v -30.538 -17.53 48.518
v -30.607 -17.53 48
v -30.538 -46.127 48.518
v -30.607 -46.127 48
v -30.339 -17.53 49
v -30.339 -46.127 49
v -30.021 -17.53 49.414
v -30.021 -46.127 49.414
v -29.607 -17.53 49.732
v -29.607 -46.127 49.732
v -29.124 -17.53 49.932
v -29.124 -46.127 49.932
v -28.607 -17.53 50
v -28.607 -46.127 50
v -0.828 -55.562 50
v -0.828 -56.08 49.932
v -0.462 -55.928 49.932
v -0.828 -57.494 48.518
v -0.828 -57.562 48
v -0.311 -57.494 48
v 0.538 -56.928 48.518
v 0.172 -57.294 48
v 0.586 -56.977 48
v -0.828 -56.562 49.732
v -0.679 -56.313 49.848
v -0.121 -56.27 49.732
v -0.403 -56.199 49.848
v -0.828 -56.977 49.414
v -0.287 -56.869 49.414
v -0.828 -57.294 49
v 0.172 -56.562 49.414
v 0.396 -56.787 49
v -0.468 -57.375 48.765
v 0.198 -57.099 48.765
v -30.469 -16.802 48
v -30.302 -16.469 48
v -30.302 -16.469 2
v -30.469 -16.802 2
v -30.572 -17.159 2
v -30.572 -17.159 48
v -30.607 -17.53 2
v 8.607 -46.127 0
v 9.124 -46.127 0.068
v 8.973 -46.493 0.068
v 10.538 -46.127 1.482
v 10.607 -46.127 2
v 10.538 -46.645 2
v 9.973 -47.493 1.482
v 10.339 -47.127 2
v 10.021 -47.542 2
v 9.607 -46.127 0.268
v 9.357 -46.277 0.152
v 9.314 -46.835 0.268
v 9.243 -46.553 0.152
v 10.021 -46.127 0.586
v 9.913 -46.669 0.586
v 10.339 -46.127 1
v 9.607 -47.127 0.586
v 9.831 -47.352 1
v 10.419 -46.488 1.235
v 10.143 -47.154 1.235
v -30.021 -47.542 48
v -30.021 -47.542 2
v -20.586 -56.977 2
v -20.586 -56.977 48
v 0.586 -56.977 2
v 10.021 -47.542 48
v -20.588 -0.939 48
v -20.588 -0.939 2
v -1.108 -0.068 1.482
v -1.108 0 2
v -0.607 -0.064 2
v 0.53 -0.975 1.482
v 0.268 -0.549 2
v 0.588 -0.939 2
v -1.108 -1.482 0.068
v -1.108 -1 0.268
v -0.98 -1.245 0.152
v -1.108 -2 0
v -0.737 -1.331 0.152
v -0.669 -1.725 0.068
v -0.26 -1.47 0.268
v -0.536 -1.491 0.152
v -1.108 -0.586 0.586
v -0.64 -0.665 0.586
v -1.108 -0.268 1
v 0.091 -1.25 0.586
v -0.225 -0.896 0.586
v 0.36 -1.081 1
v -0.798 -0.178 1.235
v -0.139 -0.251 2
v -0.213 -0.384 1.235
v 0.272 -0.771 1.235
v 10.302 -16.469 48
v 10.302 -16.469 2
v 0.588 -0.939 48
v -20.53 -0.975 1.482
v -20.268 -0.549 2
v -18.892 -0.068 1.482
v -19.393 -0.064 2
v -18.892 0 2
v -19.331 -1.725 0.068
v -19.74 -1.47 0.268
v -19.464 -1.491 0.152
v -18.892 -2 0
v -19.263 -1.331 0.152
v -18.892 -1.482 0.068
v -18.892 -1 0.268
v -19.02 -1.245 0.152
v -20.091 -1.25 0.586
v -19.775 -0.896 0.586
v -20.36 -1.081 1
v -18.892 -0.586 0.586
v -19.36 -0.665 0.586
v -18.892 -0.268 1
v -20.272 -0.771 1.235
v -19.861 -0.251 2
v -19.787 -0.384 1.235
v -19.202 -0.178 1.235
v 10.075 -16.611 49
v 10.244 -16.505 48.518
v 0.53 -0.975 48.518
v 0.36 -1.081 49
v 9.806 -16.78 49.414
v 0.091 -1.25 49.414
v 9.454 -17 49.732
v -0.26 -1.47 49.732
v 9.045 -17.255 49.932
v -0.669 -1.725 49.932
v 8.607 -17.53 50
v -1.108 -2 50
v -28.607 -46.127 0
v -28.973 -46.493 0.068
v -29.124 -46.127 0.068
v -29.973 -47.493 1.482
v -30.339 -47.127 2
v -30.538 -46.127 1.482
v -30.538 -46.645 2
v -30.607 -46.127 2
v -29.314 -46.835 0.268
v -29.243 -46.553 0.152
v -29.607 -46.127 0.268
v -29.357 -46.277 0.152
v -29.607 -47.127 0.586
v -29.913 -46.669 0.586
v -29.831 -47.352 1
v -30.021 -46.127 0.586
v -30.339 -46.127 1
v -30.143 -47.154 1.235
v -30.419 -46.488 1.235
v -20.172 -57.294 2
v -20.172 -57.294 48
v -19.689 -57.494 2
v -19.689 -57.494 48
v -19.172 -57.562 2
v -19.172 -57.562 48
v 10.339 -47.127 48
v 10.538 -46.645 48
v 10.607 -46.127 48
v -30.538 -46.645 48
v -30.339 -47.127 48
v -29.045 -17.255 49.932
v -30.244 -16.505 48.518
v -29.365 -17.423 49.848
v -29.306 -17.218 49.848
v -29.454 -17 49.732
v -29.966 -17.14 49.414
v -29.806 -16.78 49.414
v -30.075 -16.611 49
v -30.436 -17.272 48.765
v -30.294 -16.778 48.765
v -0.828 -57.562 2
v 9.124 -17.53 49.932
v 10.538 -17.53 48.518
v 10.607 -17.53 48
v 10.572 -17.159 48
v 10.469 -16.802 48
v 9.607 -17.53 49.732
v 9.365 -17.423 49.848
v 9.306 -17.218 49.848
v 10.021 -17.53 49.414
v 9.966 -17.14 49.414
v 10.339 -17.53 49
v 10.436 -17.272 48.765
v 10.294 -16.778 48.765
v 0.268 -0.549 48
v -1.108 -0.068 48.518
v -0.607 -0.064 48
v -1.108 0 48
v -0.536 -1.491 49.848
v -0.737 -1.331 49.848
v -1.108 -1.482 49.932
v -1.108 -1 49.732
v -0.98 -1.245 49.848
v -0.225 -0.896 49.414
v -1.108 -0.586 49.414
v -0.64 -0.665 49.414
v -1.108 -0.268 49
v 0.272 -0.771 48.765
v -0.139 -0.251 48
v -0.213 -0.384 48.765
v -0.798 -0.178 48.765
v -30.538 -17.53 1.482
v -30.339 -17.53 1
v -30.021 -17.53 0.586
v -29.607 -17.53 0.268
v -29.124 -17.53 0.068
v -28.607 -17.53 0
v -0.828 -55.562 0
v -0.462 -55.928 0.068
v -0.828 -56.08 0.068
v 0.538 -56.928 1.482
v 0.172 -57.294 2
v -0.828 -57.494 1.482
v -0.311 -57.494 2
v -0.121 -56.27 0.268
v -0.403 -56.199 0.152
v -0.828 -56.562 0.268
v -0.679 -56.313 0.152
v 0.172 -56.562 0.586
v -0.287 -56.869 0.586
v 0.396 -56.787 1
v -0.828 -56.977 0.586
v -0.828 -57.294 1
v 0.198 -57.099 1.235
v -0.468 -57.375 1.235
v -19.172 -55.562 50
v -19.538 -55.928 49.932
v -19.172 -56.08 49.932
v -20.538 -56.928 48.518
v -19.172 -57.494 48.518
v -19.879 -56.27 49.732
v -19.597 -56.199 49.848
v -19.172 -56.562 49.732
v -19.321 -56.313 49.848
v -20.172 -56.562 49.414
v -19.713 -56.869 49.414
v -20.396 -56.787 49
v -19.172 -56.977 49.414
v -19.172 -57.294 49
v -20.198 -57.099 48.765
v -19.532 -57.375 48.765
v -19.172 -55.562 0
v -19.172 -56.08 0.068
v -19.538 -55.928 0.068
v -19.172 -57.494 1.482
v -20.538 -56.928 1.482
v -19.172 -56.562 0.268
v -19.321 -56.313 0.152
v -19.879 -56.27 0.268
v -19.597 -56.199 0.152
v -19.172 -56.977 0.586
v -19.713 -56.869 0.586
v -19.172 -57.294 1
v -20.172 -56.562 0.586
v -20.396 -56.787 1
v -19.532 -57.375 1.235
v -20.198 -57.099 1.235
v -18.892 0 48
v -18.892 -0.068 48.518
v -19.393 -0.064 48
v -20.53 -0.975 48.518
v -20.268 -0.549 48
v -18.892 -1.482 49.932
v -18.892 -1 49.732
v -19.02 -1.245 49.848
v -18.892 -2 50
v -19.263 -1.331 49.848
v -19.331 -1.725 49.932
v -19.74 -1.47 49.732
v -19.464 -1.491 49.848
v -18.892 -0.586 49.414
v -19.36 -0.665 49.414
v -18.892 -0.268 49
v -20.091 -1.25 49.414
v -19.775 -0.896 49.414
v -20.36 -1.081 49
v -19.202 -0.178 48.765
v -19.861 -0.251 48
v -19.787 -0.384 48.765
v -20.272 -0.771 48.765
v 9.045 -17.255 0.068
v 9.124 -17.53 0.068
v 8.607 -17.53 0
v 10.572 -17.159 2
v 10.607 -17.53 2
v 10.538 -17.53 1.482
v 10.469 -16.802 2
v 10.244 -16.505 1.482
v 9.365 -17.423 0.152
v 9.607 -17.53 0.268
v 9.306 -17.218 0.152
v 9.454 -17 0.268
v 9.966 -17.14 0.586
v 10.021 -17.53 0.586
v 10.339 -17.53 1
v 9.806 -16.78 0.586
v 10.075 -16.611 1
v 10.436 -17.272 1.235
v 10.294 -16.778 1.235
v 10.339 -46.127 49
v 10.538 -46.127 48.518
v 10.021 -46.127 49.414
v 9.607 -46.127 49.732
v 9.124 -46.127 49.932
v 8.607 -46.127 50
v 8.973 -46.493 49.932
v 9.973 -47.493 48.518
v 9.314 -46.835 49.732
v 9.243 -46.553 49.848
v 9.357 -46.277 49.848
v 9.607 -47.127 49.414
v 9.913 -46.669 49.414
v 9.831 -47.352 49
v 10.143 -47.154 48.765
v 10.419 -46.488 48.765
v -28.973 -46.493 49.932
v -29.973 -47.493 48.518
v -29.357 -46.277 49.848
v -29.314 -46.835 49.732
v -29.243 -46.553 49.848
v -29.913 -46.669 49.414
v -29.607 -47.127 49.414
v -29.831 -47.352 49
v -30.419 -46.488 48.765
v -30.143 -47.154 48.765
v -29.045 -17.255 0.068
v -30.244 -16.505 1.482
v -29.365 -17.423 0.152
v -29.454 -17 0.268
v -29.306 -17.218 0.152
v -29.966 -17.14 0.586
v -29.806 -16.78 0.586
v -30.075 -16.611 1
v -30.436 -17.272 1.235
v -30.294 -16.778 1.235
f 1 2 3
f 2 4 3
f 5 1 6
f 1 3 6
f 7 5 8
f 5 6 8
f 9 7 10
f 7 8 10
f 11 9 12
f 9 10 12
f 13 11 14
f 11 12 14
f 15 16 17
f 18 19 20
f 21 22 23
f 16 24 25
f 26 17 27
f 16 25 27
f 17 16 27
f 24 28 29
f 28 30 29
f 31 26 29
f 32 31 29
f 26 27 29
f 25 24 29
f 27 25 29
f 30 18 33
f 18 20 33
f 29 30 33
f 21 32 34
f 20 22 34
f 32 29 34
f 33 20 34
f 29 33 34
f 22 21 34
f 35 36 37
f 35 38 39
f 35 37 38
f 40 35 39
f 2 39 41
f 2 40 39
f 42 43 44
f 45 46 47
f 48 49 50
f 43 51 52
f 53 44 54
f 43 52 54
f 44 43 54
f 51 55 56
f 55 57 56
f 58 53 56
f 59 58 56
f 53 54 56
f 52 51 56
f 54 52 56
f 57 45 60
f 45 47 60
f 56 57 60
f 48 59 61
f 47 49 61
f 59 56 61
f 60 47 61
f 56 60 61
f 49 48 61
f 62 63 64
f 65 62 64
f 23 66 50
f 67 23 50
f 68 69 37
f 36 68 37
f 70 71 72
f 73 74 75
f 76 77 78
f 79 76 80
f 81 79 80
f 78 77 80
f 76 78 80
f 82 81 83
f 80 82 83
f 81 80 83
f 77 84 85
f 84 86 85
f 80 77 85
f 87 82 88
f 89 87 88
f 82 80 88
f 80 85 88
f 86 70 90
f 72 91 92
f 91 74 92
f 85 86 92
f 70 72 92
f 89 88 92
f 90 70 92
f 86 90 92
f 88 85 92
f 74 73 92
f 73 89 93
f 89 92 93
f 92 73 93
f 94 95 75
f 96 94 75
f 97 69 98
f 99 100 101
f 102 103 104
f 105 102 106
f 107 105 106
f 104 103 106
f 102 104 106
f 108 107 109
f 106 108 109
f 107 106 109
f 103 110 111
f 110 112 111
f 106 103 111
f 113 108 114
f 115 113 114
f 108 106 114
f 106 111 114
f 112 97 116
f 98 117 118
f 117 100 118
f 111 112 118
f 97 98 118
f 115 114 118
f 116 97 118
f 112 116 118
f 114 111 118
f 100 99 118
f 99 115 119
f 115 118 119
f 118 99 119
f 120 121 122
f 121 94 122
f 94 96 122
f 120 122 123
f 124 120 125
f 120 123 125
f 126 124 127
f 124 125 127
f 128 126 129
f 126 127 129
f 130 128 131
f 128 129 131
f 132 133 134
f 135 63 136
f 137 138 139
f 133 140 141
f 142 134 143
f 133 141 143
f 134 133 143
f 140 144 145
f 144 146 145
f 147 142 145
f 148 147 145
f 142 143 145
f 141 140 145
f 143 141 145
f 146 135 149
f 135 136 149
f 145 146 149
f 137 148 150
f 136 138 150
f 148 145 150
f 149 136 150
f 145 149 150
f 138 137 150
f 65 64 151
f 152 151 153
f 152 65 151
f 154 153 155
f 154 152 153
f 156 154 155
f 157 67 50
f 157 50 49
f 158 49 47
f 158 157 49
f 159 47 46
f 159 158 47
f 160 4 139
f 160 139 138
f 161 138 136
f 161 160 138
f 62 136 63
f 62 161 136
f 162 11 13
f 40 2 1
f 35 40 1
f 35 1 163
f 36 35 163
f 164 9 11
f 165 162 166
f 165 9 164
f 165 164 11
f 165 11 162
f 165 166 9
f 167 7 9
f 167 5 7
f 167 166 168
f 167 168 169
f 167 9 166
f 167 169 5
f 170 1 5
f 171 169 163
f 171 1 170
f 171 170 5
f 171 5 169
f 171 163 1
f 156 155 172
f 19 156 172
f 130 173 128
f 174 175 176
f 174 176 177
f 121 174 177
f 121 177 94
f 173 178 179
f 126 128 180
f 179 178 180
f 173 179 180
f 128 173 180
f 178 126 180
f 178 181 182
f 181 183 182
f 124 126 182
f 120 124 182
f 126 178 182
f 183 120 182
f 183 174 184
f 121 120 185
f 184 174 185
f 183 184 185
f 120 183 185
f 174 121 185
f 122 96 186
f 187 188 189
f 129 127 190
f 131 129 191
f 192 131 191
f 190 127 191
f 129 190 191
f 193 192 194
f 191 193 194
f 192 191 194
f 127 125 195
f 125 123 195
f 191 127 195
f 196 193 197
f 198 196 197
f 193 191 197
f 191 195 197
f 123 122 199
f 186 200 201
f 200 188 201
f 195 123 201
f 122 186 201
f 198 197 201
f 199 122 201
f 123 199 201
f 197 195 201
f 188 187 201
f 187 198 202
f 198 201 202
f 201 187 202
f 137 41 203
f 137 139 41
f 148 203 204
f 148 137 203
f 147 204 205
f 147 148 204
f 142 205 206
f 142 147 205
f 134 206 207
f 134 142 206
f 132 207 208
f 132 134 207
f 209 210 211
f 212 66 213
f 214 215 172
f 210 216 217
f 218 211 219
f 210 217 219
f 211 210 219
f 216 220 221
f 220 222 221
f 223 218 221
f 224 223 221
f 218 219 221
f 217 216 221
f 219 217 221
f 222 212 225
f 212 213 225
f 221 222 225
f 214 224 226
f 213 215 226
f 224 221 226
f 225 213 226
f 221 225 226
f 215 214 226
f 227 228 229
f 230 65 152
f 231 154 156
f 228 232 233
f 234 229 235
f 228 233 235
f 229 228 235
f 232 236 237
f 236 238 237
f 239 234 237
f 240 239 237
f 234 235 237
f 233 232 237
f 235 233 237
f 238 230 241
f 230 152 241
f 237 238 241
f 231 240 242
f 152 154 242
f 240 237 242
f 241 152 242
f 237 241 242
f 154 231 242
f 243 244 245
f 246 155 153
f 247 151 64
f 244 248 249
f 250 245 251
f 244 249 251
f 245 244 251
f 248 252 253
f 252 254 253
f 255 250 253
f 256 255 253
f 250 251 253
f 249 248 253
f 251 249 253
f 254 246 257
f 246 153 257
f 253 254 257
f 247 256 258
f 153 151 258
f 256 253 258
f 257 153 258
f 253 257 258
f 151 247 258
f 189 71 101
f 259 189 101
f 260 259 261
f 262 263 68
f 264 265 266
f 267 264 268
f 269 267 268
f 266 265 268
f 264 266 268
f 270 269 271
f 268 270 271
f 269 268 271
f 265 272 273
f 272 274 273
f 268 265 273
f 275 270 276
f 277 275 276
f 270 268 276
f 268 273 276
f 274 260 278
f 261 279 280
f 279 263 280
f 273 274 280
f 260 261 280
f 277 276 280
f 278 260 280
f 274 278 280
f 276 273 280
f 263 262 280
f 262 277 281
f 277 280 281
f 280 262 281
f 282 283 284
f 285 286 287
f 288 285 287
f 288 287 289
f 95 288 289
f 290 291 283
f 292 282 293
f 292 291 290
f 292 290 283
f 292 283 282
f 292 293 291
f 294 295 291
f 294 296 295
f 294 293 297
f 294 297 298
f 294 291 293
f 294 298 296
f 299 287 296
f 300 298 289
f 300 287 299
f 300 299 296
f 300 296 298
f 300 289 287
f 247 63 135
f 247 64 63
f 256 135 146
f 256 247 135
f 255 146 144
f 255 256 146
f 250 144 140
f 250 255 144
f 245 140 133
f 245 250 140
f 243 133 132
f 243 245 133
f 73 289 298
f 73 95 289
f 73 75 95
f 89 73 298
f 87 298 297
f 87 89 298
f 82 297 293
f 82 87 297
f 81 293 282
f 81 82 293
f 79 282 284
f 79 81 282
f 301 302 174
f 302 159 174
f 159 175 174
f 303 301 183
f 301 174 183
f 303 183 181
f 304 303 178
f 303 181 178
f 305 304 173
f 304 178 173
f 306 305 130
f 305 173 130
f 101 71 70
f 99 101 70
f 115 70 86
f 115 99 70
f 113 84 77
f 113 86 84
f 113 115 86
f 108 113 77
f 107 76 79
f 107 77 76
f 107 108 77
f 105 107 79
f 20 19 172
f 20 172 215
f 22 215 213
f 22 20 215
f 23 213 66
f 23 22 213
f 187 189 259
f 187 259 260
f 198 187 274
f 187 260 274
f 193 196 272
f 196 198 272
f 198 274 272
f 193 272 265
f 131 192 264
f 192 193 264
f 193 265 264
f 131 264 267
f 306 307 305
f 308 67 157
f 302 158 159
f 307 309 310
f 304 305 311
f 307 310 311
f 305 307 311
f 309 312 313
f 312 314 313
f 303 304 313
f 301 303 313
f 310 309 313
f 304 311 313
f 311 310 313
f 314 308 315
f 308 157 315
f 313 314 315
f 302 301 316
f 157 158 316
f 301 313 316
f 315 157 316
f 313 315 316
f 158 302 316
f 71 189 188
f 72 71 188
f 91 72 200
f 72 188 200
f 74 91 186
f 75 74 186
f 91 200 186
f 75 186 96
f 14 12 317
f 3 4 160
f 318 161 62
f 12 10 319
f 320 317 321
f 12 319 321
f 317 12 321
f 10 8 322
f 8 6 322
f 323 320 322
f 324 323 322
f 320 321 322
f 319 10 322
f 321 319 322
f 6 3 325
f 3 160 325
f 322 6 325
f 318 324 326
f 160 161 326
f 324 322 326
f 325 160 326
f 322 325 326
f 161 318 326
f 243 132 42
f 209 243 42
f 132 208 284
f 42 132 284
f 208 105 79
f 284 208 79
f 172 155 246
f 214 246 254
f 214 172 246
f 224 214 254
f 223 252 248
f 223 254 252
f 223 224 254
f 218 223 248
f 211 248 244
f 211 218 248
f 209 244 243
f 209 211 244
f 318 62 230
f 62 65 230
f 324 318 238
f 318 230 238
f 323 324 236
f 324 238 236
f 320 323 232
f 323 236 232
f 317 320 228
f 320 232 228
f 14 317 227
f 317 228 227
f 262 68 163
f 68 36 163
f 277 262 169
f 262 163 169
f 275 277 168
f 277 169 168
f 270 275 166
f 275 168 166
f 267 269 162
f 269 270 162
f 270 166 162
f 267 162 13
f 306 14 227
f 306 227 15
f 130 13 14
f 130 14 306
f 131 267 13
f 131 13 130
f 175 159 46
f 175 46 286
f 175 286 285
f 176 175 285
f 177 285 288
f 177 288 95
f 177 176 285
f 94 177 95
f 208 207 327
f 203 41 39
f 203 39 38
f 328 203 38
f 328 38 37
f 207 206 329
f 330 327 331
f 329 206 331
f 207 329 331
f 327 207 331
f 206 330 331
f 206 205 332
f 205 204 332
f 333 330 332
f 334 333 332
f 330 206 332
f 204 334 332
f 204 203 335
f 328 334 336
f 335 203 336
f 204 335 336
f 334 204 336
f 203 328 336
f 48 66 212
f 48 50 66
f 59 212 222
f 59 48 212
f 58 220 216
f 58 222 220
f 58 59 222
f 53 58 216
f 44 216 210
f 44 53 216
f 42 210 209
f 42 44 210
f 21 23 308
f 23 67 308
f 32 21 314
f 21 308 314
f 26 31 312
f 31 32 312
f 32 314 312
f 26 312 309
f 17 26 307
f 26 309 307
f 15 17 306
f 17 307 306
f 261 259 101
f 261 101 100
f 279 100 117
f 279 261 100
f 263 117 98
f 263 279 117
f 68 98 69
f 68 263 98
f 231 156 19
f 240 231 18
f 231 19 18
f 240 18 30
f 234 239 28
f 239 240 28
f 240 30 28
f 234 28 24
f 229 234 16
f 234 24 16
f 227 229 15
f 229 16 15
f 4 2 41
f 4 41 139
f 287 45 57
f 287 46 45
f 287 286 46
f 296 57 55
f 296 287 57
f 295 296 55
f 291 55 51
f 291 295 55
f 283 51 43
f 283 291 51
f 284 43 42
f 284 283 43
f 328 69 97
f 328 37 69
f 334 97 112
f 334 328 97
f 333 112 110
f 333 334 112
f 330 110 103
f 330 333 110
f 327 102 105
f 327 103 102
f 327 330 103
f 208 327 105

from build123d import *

# Parameters (mm, degrees)
BOSS_EXTRUDE1_DEPTH = 50
FILLET1_R           = 2


with BuildPart() as part:
    # Sketch1 → Boss-Extrude1 (new body)
    with BuildSketch(Plane.XY):
        Polygon((0, 0), (-20, 0), (-30.606601718, -16.955824958), (-30.606601718, -46.955824958), (-20, -57.562426676), (0, -57.562426676), (10.606601718, -46.955824958), (10.606601718, -16.955824958), align=None)
    extrude(amount=BOSS_EXTRUDE1_DEPTH)

    # Fillet1
    fillet1_edges = [part.edges().sort_by_distance(p)[0] for p in [
        (-30.606601718, -31.955824958, 0),
        (-25.303300859, -8.477912479, 0),
        (-10, 0, 0),
        (5.303300859, -8.477912479, 0),
        (-25.303300859, -8.477912479, 50),
        (10.606601718, -16.955824958, 25),
        (10.606601718, -46.955824958, 25),
        (0, -57.562426676, 25),
        (-20, -57.562426676, 25),
        (-30.606601718, -46.955824958, 25),
        (-30.606601718, -16.955824958, 25),
        (-20, 0, 25),
        (0, 0, 25),
        (-30.606601718, -31.955824958, 50),
        (-25.303300859, -52.259125817, 50),
        (-10, -57.562426676, 50),
        (5.303300859, -52.259125817, 50),
        (10.606601718, -31.955824958, 50),
        (5.303300859, -8.477912479, 50),
        (10.606601718, -31.955824958, 0),
        (-10, 0, 50),
        (5.303300859, -52.259125817, 0),
        (-10, -57.562426676, 0),
        (-25.303300859, -52.259125817, 0),
    ]]
    fillet(fillet1_edges, radius=FILLET1_R)


solid = part.part
